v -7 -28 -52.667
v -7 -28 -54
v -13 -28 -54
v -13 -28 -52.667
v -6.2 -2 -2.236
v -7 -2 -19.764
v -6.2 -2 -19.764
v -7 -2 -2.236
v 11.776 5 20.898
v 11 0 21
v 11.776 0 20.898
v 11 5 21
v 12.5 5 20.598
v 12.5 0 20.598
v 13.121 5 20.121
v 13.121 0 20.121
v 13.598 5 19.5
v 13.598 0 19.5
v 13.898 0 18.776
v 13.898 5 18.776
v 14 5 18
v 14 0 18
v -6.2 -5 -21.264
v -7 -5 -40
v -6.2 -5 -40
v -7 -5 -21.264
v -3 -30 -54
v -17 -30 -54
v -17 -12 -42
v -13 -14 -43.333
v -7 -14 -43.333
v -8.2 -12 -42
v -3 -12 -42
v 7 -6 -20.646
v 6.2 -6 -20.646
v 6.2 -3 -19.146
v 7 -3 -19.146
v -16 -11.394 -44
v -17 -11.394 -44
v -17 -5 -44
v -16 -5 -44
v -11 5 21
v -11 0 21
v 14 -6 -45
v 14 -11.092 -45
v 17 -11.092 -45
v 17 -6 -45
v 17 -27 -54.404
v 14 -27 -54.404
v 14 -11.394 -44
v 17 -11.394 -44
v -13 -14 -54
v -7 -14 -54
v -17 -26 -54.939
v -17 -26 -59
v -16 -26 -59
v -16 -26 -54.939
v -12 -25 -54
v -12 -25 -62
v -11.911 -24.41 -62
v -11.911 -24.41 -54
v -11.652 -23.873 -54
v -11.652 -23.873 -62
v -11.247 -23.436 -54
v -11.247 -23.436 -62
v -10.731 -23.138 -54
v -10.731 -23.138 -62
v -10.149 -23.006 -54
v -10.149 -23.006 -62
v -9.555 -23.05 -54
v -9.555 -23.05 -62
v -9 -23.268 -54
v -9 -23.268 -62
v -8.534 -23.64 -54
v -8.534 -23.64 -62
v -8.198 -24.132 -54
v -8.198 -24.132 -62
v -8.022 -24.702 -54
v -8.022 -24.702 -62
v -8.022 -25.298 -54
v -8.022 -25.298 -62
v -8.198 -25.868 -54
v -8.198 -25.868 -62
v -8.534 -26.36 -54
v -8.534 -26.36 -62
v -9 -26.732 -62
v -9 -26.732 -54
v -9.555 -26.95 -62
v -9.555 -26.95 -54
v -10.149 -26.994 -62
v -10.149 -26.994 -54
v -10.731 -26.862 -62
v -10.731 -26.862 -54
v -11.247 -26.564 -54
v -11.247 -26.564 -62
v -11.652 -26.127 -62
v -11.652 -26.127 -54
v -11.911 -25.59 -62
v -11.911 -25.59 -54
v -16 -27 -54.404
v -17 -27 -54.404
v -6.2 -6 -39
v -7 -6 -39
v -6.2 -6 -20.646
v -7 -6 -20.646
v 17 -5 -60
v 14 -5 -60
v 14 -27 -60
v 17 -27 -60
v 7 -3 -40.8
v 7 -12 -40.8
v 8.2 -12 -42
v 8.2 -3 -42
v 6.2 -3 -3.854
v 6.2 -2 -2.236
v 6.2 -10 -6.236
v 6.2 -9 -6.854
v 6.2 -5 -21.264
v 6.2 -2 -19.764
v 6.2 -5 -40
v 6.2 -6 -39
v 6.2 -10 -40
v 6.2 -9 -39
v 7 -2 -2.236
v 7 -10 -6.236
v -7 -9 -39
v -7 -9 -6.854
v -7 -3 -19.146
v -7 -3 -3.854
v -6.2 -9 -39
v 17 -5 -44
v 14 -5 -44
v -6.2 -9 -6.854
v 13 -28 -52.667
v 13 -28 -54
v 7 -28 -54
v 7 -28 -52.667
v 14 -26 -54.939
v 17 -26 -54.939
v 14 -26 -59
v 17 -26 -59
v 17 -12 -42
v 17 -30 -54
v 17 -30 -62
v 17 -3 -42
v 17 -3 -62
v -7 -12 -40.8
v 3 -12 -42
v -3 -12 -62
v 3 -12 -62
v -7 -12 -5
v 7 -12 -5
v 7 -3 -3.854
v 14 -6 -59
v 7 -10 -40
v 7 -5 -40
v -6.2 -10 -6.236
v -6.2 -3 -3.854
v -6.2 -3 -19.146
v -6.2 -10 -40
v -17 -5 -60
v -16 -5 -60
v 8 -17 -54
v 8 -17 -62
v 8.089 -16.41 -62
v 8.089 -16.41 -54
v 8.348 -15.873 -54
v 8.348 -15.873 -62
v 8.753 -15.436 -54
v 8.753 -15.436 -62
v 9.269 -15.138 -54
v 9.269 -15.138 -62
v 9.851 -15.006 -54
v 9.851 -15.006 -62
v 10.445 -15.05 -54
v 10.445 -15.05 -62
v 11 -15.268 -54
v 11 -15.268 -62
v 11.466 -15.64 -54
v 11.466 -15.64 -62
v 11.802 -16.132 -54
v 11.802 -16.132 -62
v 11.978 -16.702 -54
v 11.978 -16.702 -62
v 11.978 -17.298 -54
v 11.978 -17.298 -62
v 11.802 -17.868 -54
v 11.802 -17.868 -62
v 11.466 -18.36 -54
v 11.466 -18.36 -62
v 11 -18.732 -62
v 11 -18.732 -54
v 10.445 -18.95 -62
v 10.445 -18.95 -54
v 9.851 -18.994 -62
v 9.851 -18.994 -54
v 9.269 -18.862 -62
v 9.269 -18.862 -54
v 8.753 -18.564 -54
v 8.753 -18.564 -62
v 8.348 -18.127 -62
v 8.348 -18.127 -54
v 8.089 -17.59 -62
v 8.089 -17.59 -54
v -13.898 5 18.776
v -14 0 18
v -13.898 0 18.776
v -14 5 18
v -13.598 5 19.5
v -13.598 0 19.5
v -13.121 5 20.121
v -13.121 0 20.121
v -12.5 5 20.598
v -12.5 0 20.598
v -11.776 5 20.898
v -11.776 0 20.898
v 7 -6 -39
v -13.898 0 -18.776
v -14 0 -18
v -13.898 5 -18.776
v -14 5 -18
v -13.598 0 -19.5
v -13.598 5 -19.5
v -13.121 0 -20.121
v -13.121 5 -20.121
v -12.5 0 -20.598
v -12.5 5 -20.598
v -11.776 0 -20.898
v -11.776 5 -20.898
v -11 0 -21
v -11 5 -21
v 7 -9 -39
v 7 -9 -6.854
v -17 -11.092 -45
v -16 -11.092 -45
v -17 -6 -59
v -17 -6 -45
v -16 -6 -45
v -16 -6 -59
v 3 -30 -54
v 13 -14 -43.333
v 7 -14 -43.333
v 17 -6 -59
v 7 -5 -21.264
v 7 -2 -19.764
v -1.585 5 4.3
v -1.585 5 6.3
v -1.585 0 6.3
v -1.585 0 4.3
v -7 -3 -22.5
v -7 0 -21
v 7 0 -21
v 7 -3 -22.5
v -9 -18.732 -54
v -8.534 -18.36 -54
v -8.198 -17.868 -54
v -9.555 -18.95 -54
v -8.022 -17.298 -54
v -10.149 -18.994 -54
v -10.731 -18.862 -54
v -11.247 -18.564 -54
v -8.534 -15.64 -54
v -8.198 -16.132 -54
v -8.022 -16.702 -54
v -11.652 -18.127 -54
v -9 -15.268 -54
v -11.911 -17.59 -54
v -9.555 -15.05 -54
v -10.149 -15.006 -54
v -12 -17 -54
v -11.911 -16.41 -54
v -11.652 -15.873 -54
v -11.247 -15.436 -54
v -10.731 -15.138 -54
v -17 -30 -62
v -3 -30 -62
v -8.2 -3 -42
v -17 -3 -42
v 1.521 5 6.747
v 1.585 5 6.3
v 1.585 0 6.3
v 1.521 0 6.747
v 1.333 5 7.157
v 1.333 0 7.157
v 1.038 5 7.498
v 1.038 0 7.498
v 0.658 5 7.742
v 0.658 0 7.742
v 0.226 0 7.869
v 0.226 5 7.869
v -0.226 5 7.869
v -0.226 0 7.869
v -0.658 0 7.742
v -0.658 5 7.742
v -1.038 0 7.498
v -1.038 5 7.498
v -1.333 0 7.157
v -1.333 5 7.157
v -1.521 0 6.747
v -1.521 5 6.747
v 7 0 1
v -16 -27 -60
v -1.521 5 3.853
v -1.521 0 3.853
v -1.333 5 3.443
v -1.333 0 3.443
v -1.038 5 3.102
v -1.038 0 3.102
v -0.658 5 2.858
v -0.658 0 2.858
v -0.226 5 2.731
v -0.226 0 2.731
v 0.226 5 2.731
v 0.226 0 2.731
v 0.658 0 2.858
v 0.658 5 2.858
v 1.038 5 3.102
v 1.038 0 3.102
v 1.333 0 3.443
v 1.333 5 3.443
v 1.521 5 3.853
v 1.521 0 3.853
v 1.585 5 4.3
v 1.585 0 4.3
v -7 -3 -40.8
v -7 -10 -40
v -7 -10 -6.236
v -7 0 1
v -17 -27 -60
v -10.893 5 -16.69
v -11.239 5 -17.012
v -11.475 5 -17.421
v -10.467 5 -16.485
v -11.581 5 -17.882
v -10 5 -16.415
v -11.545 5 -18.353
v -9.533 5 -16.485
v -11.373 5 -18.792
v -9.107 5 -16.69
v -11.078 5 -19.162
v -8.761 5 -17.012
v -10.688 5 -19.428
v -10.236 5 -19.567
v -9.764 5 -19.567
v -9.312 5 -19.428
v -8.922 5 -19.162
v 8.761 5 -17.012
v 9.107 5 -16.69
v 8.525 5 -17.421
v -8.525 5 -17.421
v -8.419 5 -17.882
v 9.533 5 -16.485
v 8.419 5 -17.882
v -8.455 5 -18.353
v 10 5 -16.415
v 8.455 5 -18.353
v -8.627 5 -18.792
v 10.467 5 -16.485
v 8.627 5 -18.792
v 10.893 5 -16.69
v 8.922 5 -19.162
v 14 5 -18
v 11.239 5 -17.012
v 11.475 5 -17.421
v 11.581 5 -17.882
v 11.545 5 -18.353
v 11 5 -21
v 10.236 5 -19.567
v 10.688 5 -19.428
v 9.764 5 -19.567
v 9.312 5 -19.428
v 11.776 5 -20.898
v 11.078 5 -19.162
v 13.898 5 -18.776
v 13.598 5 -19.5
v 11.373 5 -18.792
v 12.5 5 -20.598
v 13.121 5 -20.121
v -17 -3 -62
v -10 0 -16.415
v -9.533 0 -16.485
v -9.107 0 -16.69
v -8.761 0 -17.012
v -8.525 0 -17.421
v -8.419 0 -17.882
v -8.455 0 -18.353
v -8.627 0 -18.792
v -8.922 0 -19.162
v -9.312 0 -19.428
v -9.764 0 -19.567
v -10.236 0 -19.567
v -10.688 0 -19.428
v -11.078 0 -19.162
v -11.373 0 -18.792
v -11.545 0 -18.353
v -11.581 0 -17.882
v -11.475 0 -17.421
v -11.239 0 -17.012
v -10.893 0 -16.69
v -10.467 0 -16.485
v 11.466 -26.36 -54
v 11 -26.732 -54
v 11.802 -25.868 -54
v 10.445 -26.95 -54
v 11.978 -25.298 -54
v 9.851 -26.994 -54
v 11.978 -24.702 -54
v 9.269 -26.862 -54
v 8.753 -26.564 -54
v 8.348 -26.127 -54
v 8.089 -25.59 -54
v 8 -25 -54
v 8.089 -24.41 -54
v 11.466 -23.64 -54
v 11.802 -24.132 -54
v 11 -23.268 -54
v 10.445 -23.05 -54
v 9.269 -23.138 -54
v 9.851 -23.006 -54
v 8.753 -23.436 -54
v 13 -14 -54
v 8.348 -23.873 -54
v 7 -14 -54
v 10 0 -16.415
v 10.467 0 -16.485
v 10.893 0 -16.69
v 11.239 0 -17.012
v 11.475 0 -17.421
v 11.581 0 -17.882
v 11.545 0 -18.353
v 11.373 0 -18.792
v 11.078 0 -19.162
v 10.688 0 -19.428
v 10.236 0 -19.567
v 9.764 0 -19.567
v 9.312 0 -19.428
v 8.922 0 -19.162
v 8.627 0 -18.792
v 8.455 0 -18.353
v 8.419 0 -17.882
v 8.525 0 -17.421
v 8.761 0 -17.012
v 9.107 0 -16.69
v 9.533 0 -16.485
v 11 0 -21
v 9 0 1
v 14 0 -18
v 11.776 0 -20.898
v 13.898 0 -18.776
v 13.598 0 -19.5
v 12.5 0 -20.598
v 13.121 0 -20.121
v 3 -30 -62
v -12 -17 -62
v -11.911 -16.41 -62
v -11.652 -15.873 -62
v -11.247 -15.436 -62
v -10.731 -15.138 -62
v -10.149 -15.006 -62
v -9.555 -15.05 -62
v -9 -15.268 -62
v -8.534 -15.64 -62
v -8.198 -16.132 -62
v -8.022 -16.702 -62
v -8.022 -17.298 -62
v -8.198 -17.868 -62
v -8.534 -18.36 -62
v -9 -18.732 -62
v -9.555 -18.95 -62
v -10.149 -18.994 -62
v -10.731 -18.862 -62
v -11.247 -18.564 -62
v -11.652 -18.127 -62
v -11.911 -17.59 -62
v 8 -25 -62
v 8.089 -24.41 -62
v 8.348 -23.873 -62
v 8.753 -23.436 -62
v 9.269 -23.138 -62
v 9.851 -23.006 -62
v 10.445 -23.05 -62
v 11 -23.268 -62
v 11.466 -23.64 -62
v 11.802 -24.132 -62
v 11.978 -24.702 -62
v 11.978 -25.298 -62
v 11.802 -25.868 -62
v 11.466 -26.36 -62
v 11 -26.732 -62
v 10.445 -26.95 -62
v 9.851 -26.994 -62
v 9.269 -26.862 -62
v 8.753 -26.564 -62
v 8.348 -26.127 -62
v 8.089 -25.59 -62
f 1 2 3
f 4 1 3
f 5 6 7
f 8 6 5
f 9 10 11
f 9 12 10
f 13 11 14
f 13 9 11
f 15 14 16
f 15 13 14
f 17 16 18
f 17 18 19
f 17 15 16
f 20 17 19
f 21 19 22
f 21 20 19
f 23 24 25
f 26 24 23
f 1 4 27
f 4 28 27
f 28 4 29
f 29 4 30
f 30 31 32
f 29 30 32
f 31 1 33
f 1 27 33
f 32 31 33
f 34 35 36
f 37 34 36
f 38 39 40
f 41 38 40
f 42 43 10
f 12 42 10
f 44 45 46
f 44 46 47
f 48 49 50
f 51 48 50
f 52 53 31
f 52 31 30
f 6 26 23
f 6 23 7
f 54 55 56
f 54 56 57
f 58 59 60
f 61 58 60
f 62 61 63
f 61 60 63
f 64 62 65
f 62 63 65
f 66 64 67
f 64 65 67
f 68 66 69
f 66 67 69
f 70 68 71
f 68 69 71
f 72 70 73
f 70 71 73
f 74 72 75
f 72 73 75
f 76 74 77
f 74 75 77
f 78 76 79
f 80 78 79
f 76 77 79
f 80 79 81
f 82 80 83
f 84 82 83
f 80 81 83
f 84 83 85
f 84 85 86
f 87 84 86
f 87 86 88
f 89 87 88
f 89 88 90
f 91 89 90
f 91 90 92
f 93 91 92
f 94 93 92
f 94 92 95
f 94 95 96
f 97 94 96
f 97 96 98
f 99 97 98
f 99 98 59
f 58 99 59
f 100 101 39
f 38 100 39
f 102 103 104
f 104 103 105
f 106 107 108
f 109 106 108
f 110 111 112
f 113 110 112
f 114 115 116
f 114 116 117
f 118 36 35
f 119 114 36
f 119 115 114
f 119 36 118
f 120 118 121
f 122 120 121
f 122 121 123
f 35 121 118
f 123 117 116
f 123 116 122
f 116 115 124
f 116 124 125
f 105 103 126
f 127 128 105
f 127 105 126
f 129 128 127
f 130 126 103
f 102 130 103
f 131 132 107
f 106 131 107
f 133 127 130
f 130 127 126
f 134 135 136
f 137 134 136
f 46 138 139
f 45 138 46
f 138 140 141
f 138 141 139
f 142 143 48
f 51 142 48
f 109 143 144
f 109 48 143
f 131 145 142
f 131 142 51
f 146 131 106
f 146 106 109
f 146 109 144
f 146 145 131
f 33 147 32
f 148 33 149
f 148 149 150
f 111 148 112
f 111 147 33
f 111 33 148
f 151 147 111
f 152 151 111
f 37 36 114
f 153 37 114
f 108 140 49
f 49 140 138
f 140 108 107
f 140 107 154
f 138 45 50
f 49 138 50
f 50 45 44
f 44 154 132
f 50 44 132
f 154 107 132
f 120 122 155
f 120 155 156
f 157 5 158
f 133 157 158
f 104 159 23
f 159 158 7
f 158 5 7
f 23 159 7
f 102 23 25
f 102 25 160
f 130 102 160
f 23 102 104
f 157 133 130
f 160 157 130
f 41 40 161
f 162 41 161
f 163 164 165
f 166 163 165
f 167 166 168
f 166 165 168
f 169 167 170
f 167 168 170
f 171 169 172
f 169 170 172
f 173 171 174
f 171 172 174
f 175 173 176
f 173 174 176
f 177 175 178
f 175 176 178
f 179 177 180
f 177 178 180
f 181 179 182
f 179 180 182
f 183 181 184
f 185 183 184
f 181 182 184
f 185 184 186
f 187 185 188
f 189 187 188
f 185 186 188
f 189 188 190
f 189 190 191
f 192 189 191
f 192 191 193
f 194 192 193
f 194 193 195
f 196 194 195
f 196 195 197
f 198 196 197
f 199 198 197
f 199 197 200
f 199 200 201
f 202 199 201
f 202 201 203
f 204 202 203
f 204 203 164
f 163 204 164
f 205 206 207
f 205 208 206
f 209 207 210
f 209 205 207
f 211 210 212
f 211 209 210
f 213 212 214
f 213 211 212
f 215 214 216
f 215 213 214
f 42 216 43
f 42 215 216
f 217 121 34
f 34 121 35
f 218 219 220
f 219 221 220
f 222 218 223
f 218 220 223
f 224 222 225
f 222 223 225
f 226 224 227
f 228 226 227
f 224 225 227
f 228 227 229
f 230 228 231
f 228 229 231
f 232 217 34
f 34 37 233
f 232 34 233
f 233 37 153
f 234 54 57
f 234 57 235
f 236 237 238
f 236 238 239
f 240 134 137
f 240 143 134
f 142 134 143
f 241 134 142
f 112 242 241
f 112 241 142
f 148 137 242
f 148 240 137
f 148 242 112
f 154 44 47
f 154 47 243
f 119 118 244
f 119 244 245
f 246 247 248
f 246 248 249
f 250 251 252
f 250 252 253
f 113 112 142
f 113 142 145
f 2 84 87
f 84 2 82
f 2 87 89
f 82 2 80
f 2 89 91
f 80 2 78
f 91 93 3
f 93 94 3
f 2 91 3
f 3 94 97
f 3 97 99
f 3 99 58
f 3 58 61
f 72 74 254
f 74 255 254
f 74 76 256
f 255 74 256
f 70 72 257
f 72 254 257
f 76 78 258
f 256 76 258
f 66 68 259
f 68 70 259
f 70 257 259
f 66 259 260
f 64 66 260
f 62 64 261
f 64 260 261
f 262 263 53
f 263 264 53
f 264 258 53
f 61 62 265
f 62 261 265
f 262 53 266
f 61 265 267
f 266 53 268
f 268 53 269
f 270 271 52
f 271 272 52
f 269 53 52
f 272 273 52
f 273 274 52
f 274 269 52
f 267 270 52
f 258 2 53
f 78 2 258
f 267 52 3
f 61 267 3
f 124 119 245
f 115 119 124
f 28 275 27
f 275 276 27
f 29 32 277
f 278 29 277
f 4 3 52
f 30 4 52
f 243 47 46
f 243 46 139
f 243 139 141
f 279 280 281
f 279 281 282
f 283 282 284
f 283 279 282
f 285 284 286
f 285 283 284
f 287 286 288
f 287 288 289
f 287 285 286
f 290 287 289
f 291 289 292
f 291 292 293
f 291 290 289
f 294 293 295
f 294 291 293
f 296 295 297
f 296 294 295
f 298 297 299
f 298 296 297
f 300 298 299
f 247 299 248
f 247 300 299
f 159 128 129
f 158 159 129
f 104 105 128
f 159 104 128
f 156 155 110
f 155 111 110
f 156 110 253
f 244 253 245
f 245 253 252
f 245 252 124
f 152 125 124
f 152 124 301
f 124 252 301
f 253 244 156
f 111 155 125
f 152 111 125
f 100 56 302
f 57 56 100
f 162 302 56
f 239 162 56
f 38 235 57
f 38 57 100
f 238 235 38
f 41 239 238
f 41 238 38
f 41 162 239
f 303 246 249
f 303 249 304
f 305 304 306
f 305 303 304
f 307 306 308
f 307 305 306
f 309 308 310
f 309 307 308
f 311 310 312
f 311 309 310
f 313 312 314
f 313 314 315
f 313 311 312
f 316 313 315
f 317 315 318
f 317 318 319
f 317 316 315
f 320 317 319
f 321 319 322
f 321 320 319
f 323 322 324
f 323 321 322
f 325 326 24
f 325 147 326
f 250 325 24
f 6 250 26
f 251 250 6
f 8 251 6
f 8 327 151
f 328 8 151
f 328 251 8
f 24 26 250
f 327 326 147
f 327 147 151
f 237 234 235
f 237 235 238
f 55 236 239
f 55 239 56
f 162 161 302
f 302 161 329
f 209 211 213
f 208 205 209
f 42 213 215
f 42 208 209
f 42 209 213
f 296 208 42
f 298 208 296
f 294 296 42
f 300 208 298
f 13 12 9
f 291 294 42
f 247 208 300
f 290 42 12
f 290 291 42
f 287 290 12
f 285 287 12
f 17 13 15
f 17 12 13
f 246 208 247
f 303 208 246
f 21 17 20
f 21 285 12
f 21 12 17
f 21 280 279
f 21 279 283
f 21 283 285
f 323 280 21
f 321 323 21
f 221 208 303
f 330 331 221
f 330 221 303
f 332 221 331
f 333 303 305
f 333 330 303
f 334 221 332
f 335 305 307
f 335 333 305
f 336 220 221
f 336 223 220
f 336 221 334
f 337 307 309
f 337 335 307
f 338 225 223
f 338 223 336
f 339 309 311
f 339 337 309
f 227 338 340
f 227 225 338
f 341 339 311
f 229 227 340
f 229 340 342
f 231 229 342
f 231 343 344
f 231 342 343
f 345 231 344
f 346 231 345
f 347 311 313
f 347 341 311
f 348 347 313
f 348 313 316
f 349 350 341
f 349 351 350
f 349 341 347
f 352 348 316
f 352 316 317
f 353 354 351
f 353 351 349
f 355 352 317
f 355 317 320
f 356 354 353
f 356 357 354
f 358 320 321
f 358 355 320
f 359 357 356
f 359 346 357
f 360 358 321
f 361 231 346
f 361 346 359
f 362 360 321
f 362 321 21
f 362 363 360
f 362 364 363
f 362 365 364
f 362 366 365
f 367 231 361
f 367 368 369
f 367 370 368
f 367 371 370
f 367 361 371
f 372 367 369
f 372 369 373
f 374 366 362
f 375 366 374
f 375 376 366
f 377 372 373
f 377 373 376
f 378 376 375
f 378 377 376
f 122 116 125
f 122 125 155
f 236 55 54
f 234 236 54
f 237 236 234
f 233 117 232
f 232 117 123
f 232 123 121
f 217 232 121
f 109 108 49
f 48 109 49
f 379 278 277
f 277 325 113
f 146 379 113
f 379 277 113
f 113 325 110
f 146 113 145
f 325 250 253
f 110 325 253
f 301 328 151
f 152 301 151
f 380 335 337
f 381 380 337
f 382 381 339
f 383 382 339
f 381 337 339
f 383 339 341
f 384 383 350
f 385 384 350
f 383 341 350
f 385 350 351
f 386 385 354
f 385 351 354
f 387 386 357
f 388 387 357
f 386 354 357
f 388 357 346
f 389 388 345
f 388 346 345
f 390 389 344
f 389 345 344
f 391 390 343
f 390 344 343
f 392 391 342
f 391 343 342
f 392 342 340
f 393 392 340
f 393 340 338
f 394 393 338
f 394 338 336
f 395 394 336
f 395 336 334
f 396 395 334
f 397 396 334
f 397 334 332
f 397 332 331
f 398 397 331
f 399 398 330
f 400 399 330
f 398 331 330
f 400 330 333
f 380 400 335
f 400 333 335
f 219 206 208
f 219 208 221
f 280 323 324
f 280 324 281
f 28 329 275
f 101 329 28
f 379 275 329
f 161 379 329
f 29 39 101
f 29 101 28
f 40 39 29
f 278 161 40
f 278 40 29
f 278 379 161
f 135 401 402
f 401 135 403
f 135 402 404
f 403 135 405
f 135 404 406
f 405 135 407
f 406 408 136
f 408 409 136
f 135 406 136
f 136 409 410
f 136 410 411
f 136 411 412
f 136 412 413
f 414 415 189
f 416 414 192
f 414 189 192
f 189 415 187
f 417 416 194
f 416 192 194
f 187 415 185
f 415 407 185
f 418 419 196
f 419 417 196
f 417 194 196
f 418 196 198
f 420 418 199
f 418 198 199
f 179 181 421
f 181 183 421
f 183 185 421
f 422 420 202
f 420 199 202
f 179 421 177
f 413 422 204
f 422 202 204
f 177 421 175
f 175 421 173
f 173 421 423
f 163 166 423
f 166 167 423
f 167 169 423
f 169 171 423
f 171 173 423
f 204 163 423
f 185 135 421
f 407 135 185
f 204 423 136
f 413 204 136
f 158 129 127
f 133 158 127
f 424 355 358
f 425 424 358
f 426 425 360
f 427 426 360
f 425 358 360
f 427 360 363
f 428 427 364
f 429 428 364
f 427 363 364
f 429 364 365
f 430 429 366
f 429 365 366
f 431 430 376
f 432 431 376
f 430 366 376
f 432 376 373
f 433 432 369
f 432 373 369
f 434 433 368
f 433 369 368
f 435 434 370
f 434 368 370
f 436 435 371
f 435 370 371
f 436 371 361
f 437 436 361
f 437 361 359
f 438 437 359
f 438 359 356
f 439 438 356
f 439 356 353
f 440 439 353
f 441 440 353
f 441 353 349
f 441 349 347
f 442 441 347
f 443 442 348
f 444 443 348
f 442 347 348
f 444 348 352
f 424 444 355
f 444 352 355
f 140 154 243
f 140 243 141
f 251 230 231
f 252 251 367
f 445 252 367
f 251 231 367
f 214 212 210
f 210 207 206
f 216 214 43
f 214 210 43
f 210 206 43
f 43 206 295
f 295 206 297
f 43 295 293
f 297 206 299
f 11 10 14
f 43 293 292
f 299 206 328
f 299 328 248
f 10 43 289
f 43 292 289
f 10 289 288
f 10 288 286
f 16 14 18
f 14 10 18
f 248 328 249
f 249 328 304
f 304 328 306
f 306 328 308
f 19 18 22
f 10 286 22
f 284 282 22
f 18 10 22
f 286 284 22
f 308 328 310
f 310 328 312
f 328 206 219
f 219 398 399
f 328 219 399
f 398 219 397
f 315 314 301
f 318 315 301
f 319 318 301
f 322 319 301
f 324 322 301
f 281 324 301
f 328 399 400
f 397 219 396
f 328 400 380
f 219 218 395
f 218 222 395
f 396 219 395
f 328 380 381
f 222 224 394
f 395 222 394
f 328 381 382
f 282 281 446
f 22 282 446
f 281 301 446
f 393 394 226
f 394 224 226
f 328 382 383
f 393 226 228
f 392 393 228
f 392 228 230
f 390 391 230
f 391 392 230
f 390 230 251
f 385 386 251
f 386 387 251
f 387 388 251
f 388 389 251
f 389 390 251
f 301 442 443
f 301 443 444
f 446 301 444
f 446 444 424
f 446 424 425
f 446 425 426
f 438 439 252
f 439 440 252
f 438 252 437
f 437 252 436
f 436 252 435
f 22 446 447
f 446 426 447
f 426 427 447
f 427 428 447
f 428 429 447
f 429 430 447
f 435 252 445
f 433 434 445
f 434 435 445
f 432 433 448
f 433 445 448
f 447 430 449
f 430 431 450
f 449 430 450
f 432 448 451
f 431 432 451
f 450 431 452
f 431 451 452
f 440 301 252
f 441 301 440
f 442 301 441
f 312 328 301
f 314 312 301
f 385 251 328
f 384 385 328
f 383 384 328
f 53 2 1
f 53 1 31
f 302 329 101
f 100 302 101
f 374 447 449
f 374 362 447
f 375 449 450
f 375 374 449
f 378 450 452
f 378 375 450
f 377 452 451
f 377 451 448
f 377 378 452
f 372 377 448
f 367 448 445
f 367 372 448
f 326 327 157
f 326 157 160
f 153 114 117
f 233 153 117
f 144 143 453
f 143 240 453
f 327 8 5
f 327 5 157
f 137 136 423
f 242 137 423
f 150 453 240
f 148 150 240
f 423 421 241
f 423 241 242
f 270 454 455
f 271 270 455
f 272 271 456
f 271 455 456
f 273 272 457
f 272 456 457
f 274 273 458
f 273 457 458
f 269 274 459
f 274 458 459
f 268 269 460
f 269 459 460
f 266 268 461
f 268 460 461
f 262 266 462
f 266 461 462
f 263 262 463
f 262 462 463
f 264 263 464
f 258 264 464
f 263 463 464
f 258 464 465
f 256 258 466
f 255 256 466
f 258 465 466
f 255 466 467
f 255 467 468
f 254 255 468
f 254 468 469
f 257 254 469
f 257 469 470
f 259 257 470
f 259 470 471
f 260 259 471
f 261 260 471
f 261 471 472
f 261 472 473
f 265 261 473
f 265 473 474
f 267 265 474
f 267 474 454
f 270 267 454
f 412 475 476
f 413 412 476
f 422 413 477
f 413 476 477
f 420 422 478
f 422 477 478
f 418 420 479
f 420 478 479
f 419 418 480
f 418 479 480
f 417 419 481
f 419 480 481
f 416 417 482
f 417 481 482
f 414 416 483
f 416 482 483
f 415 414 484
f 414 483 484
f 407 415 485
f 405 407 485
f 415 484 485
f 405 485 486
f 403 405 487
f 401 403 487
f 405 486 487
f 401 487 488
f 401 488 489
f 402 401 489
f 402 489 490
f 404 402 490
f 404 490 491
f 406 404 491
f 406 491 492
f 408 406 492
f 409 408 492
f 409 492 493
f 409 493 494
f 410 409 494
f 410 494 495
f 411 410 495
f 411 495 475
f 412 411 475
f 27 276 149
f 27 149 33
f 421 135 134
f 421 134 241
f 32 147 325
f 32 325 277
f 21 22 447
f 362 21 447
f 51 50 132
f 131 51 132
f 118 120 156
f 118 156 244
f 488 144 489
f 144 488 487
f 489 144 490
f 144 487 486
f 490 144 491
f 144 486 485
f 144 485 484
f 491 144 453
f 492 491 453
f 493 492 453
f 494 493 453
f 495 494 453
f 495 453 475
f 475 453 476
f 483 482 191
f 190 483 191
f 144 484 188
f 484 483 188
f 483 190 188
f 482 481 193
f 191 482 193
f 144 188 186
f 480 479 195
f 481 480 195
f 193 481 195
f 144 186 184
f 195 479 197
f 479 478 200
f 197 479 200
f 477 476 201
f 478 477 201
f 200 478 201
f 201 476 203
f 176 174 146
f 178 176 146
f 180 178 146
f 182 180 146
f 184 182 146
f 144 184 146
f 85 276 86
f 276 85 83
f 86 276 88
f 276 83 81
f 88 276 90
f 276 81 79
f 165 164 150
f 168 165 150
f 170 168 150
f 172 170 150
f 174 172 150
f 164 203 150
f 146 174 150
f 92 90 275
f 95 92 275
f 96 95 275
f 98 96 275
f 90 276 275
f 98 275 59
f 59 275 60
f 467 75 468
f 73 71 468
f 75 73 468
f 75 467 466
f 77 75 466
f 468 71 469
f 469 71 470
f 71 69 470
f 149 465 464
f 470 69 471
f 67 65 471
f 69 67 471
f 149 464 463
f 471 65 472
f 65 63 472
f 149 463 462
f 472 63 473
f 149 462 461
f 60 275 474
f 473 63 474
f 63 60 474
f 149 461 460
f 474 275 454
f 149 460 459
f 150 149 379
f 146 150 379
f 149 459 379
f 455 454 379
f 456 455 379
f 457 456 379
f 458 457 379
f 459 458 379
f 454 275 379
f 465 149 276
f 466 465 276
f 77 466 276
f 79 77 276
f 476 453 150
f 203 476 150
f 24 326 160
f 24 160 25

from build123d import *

# Parameters (mm, degrees)
SKETCH1_W                = 28
SKETCH1_H                = 42
BOSS_EXTRUDE1_DEPTH      = 5
FILLET1_R                = 3
SKETCH3_R                = 1.585
CUT_EXTRUDE1_DEPTH       = 5
SKETCH4_W                = 14
SKETCH4_H                = 63
BOSS_EXTRUDE2_DEPTH      = 12
SKETCH5_W                = 14
SKETCH5_H                = 41
CUT_EXTRUDE2_DEPTH       = 3
SKETCH6_W                = 4
SKETCH6_H                = 8
BOSS_EXTRUDE3_DEPTH      = 18
SKETCH7_W                = 8
SKETCH7_H                = 27
BOSS_EXTRUDE4_DEPTH      = 10
SKETCH8_W                = 8
SKETCH8_H                = 27
BOSS_EXTRUDE5_DEPTH      = 10
BOSS_EXTRUDE6_DEPTH      = 10
BOSS_EXTRUDE6_DEPTH_BACK = 4
BOSS_EXTRUDE7_DEPTH      = 10
BOSS_EXTRUDE7_DEPTH_BACK = 4
CUT_EXTRUDE5_DEPTH       = 16
BOSS_EXTRUDE8_DEPTH      = 14
SKETCH16_R               = 2
CUT_EXTRUDE6_DEPTH       = 27
CUT_EXTRUDE8_START       = -8
SKETCH19_W               = 6
SKETCH19_H               = 14
CUT_EXTRUDE8_DEPTH       = 14
CUT_EXTRUDE9_DEPTH       = 1
CUT_EXTRUDE10_START      = -31
CUT_EXTRUDE10_DEPTH      = 3
CUT_EXTRUDE11_DEPTH      = 0.8
CUT_EXTRUDE12_START      = -13.2
CUT_EXTRUDE12_DEPTH      = 7.8
BOSS_EXTRUDE10_DEPTH     = 9


with BuildPart() as part:
    # Sketch1 → Boss-Extrude1 (new body)
    with BuildSketch(Plane(origin=(0, 0, 0), x_dir=(1, 0, 0), z_dir=(0, 1, 0))):
        Rectangle(SKETCH1_W, SKETCH1_H)
    extrude(amount=BOSS_EXTRUDE1_DEPTH)

    # Fillet1
    fillet1_edges = [part.edges().sort_by_distance(p)[0] for p in [
        (-14, 2.5, 21),
        (-14, 2.5, -21),
        (14, 2.5, -21),
        (14, 2.5, 21),
    ]]
    fillet(fillet1_edges, radius=FILLET1_R)

    # Sketch3 → Cut-Extrude1 (cut)
    with BuildSketch(Plane(origin=(0, 5, 0), x_dir=(1, 0, 0), z_dir=(0, 1, 0))):
        with Locations(Location((10, 18, 0), (0, 0, 270))):
            Circle(SKETCH3_R)
        with Locations(Location((-10, 18, 0), (0, 0, 270))):
            Circle(SKETCH3_R)
        with BuildLine():
            Line((1.585, -4.3), (1.585, -6.3))
            ThreePointArc((1.585, -6.3), (0, -7.885), (-1.585, -6.3))
            Line((-1.585, -6.3), (-1.585, -4.3))
            ThreePointArc((-1.585, -4.3), (0, -2.715), (1.585, -4.3))
        make_face()
    extrude(amount=-CUT_EXTRUDE1_DEPTH, mode=Mode.SUBTRACT)

    # Sketch4 → Boss-Extrude2 (add)
    with BuildSketch(Plane.XZ):
        with Locations((0, -30.5)):
            Rectangle(SKETCH4_W, SKETCH4_H)
    extrude(amount=BOSS_EXTRUDE2_DEPTH)

    # Sketch5 → Cut-Extrude2 (cut)
    with BuildSketch(Plane(origin=(0, 0, 0), x_dir=(1, 0, 0), z_dir=(0, 1, 0))):
        with Locations((0, 41.5)):
            Rectangle(SKETCH5_W, SKETCH5_H)
    extrude(amount=-CUT_EXTRUDE2_DEPTH, mode=Mode.SUBTRACT)

    # Sketch6 → Boss-Extrude3 (add)
    with BuildSketch(Plane.XZ.offset(12)):
        with Locations((-5, -58)):
            Rectangle(SKETCH6_W, SKETCH6_H)
        with Locations((5, -58)):
            Rectangle(SKETCH6_W, SKETCH6_H)
    extrude(amount=BOSS_EXTRUDE3_DEPTH)

    # Sketch7 → Boss-Extrude4 (add)
    with BuildSketch(Plane.ZY.offset(7)):
        with Locations((-58, -16.5)):
            Rectangle(SKETCH7_W, SKETCH7_H)
    extrude(amount=BOSS_EXTRUDE4_DEPTH)

    # Sketch8 → Boss-Extrude5 (add)
    with BuildSketch(Plane(origin=(7, 0, 0), x_dir=(0, 0, -1), z_dir=(1, 0, 0))):
        with Locations((58, -16.5)):
            Rectangle(SKETCH8_W, SKETCH8_H)
    extrude(amount=BOSS_EXTRUDE5_DEPTH)

    # Sketch9 → Boss-Extrude6 (add, two sides: drawn at the far end of the back side and taken through both)
    with BuildSketch(Plane.ZY.offset(7).offset(-BOSS_EXTRUDE6_DEPTH_BACK)):
        Polygon((-54, -30), (-42, -12), (-42, -3), (-54, -3), align=None)
    extrude(amount=BOSS_EXTRUDE6_DEPTH + BOSS_EXTRUDE6_DEPTH_BACK)

    # Sketch10 → Boss-Extrude7 (add, two sides: drawn at the far end of the back side and taken through both)
    with BuildSketch(Plane(origin=(7, 0, 0), x_dir=(0, 0, -1), z_dir=(1, 0, 0)).offset(-BOSS_EXTRUDE7_DEPTH_BACK)):
        Polygon((42, -12), (42, -3), (54, -3), (54, -30), align=None)
    extrude(amount=BOSS_EXTRUDE7_DEPTH + BOSS_EXTRUDE7_DEPTH_BACK)

    # Sketch13 → Cut-Extrude5 (cut)
    with BuildSketch(Plane.ZY.offset(7)):
        Polygon((1, 0), (-5, -12), (1, -12), align=None)
    extrude(amount=-CUT_EXTRUDE5_DEPTH, mode=Mode.SUBTRACT)

    # Sketch14 → Boss-Extrude8 (add)
    with BuildSketch(Plane.ZY.offset(7)):
        Polygon((-21, 0), (-22.5, -3), (-21, -3), align=None)
    extrude(amount=-BOSS_EXTRUDE8_DEPTH)

    # Sketch16 → Cut-Extrude6 (cut)
    with BuildSketch(Plane(origin=(0, 0, -62), x_dir=(-1, 0, 0), z_dir=(0, 0, -1))):
        with Locations((-10, -17)):
            Circle(SKETCH16_R)
        with Locations((-10, -25)):
            Circle(SKETCH16_R)
        with Locations((10, -17)):
            Circle(SKETCH16_R)
        with Locations((10, -25)):
            Circle(SKETCH16_R)
    extrude(amount=-CUT_EXTRUDE6_DEPTH, mode=Mode.SUBTRACT)

    # Sketch19 → Cut-Extrude8 (cut)
    with BuildSketch(Plane(origin=(0, 0, -62), x_dir=(-1, 0, 0), z_dir=(0, 0, -1)).offset(CUT_EXTRUDE8_START)):
        with Locations((-10, -21)):
            Rectangle(SKETCH19_W, SKETCH19_H)
        with Locations((10, -21)):
            Rectangle(SKETCH19_W, SKETCH19_H)
    extrude(amount=-CUT_EXTRUDE8_DEPTH, mode=Mode.SUBTRACT)

    # Sketch20 → Cut-Extrude9 (cut)
    with BuildSketch(Plane.ZY.offset(17)):
        Polygon((-60, -5), (-60, -27), (-54.40370085, -27), (-44, -11.394448725), (-44, -5), align=None)
        Polygon((-59, -6), (-59, -26), (-54.938884609, -26), (-45, -11.091673087), (-45, -6), align=None, mode=Mode.SUBTRACT)
    extrude(amount=-CUT_EXTRUDE9_DEPTH, mode=Mode.SUBTRACT)

    # Sketch24 → Cut-Extrude10 (cut)
    with BuildSketch(Plane.ZY.offset(17).offset(CUT_EXTRUDE10_START)):
        Polygon((-60, -5), (-60, -27), (-54.40370085, -27), (-44, -11.394448725), (-44, -5), align=None)
        Polygon((-59, -6), (-59, -26), (-54.938884609, -26), (-45, -11.091673087), (-45, -6), align=None, mode=Mode.SUBTRACT)
    extrude(amount=-CUT_EXTRUDE10_DEPTH, mode=Mode.SUBTRACT)

    # Sketch25 → Cut-Extrude11 (cut)
    with BuildSketch(Plane.ZY.offset(7)):
        Polygon((-40, -5), (-21.263932023, -5), (-19.763932023, -2), (-2.236067977, -2), (-6.236067977, -10), (-40, -10), align=None)
        Polygon((-39, -6), (-20.645898034, -6), (-19.145898034, -3), (-3.854101966, -3), (-6.854101966, -9), (-39, -9), align=None, mode=Mode.SUBTRACT)
    extrude(amount=-CUT_EXTRUDE11_DEPTH, mode=Mode.SUBTRACT)

    # Sketch26 → Cut-Extrude12 (cut)
    with BuildSketch(Plane.ZY.offset(7).offset(CUT_EXTRUDE12_START)):
        Polygon((-40, -5), (-21.263932023, -5), (-19.763932023, -2), (-2.236067977, -2), (-6.236067977, -10), (-40, -10), align=None)
        Polygon((-39, -6), (-20.645898034, -6), (-19.145898034, -3), (-3.854101966, -3), (-6.854101966, -9), (-39, -9), align=None, mode=Mode.SUBTRACT)
    extrude(amount=-CUT_EXTRUDE12_DEPTH, mode=Mode.SUBTRACT)

    # Sketch30 → Boss-Extrude10 (add)
    with BuildSketch(Plane.XZ.offset(12)):
        Polygon((-7, -42), (-7, -40.8), (-8.2, -42), align=None)
        Polygon((7, -42), (7, -40.8), (8.2, -42), align=None)
    extrude(amount=-BOSS_EXTRUDE10_DEPTH)


solid = part.part
